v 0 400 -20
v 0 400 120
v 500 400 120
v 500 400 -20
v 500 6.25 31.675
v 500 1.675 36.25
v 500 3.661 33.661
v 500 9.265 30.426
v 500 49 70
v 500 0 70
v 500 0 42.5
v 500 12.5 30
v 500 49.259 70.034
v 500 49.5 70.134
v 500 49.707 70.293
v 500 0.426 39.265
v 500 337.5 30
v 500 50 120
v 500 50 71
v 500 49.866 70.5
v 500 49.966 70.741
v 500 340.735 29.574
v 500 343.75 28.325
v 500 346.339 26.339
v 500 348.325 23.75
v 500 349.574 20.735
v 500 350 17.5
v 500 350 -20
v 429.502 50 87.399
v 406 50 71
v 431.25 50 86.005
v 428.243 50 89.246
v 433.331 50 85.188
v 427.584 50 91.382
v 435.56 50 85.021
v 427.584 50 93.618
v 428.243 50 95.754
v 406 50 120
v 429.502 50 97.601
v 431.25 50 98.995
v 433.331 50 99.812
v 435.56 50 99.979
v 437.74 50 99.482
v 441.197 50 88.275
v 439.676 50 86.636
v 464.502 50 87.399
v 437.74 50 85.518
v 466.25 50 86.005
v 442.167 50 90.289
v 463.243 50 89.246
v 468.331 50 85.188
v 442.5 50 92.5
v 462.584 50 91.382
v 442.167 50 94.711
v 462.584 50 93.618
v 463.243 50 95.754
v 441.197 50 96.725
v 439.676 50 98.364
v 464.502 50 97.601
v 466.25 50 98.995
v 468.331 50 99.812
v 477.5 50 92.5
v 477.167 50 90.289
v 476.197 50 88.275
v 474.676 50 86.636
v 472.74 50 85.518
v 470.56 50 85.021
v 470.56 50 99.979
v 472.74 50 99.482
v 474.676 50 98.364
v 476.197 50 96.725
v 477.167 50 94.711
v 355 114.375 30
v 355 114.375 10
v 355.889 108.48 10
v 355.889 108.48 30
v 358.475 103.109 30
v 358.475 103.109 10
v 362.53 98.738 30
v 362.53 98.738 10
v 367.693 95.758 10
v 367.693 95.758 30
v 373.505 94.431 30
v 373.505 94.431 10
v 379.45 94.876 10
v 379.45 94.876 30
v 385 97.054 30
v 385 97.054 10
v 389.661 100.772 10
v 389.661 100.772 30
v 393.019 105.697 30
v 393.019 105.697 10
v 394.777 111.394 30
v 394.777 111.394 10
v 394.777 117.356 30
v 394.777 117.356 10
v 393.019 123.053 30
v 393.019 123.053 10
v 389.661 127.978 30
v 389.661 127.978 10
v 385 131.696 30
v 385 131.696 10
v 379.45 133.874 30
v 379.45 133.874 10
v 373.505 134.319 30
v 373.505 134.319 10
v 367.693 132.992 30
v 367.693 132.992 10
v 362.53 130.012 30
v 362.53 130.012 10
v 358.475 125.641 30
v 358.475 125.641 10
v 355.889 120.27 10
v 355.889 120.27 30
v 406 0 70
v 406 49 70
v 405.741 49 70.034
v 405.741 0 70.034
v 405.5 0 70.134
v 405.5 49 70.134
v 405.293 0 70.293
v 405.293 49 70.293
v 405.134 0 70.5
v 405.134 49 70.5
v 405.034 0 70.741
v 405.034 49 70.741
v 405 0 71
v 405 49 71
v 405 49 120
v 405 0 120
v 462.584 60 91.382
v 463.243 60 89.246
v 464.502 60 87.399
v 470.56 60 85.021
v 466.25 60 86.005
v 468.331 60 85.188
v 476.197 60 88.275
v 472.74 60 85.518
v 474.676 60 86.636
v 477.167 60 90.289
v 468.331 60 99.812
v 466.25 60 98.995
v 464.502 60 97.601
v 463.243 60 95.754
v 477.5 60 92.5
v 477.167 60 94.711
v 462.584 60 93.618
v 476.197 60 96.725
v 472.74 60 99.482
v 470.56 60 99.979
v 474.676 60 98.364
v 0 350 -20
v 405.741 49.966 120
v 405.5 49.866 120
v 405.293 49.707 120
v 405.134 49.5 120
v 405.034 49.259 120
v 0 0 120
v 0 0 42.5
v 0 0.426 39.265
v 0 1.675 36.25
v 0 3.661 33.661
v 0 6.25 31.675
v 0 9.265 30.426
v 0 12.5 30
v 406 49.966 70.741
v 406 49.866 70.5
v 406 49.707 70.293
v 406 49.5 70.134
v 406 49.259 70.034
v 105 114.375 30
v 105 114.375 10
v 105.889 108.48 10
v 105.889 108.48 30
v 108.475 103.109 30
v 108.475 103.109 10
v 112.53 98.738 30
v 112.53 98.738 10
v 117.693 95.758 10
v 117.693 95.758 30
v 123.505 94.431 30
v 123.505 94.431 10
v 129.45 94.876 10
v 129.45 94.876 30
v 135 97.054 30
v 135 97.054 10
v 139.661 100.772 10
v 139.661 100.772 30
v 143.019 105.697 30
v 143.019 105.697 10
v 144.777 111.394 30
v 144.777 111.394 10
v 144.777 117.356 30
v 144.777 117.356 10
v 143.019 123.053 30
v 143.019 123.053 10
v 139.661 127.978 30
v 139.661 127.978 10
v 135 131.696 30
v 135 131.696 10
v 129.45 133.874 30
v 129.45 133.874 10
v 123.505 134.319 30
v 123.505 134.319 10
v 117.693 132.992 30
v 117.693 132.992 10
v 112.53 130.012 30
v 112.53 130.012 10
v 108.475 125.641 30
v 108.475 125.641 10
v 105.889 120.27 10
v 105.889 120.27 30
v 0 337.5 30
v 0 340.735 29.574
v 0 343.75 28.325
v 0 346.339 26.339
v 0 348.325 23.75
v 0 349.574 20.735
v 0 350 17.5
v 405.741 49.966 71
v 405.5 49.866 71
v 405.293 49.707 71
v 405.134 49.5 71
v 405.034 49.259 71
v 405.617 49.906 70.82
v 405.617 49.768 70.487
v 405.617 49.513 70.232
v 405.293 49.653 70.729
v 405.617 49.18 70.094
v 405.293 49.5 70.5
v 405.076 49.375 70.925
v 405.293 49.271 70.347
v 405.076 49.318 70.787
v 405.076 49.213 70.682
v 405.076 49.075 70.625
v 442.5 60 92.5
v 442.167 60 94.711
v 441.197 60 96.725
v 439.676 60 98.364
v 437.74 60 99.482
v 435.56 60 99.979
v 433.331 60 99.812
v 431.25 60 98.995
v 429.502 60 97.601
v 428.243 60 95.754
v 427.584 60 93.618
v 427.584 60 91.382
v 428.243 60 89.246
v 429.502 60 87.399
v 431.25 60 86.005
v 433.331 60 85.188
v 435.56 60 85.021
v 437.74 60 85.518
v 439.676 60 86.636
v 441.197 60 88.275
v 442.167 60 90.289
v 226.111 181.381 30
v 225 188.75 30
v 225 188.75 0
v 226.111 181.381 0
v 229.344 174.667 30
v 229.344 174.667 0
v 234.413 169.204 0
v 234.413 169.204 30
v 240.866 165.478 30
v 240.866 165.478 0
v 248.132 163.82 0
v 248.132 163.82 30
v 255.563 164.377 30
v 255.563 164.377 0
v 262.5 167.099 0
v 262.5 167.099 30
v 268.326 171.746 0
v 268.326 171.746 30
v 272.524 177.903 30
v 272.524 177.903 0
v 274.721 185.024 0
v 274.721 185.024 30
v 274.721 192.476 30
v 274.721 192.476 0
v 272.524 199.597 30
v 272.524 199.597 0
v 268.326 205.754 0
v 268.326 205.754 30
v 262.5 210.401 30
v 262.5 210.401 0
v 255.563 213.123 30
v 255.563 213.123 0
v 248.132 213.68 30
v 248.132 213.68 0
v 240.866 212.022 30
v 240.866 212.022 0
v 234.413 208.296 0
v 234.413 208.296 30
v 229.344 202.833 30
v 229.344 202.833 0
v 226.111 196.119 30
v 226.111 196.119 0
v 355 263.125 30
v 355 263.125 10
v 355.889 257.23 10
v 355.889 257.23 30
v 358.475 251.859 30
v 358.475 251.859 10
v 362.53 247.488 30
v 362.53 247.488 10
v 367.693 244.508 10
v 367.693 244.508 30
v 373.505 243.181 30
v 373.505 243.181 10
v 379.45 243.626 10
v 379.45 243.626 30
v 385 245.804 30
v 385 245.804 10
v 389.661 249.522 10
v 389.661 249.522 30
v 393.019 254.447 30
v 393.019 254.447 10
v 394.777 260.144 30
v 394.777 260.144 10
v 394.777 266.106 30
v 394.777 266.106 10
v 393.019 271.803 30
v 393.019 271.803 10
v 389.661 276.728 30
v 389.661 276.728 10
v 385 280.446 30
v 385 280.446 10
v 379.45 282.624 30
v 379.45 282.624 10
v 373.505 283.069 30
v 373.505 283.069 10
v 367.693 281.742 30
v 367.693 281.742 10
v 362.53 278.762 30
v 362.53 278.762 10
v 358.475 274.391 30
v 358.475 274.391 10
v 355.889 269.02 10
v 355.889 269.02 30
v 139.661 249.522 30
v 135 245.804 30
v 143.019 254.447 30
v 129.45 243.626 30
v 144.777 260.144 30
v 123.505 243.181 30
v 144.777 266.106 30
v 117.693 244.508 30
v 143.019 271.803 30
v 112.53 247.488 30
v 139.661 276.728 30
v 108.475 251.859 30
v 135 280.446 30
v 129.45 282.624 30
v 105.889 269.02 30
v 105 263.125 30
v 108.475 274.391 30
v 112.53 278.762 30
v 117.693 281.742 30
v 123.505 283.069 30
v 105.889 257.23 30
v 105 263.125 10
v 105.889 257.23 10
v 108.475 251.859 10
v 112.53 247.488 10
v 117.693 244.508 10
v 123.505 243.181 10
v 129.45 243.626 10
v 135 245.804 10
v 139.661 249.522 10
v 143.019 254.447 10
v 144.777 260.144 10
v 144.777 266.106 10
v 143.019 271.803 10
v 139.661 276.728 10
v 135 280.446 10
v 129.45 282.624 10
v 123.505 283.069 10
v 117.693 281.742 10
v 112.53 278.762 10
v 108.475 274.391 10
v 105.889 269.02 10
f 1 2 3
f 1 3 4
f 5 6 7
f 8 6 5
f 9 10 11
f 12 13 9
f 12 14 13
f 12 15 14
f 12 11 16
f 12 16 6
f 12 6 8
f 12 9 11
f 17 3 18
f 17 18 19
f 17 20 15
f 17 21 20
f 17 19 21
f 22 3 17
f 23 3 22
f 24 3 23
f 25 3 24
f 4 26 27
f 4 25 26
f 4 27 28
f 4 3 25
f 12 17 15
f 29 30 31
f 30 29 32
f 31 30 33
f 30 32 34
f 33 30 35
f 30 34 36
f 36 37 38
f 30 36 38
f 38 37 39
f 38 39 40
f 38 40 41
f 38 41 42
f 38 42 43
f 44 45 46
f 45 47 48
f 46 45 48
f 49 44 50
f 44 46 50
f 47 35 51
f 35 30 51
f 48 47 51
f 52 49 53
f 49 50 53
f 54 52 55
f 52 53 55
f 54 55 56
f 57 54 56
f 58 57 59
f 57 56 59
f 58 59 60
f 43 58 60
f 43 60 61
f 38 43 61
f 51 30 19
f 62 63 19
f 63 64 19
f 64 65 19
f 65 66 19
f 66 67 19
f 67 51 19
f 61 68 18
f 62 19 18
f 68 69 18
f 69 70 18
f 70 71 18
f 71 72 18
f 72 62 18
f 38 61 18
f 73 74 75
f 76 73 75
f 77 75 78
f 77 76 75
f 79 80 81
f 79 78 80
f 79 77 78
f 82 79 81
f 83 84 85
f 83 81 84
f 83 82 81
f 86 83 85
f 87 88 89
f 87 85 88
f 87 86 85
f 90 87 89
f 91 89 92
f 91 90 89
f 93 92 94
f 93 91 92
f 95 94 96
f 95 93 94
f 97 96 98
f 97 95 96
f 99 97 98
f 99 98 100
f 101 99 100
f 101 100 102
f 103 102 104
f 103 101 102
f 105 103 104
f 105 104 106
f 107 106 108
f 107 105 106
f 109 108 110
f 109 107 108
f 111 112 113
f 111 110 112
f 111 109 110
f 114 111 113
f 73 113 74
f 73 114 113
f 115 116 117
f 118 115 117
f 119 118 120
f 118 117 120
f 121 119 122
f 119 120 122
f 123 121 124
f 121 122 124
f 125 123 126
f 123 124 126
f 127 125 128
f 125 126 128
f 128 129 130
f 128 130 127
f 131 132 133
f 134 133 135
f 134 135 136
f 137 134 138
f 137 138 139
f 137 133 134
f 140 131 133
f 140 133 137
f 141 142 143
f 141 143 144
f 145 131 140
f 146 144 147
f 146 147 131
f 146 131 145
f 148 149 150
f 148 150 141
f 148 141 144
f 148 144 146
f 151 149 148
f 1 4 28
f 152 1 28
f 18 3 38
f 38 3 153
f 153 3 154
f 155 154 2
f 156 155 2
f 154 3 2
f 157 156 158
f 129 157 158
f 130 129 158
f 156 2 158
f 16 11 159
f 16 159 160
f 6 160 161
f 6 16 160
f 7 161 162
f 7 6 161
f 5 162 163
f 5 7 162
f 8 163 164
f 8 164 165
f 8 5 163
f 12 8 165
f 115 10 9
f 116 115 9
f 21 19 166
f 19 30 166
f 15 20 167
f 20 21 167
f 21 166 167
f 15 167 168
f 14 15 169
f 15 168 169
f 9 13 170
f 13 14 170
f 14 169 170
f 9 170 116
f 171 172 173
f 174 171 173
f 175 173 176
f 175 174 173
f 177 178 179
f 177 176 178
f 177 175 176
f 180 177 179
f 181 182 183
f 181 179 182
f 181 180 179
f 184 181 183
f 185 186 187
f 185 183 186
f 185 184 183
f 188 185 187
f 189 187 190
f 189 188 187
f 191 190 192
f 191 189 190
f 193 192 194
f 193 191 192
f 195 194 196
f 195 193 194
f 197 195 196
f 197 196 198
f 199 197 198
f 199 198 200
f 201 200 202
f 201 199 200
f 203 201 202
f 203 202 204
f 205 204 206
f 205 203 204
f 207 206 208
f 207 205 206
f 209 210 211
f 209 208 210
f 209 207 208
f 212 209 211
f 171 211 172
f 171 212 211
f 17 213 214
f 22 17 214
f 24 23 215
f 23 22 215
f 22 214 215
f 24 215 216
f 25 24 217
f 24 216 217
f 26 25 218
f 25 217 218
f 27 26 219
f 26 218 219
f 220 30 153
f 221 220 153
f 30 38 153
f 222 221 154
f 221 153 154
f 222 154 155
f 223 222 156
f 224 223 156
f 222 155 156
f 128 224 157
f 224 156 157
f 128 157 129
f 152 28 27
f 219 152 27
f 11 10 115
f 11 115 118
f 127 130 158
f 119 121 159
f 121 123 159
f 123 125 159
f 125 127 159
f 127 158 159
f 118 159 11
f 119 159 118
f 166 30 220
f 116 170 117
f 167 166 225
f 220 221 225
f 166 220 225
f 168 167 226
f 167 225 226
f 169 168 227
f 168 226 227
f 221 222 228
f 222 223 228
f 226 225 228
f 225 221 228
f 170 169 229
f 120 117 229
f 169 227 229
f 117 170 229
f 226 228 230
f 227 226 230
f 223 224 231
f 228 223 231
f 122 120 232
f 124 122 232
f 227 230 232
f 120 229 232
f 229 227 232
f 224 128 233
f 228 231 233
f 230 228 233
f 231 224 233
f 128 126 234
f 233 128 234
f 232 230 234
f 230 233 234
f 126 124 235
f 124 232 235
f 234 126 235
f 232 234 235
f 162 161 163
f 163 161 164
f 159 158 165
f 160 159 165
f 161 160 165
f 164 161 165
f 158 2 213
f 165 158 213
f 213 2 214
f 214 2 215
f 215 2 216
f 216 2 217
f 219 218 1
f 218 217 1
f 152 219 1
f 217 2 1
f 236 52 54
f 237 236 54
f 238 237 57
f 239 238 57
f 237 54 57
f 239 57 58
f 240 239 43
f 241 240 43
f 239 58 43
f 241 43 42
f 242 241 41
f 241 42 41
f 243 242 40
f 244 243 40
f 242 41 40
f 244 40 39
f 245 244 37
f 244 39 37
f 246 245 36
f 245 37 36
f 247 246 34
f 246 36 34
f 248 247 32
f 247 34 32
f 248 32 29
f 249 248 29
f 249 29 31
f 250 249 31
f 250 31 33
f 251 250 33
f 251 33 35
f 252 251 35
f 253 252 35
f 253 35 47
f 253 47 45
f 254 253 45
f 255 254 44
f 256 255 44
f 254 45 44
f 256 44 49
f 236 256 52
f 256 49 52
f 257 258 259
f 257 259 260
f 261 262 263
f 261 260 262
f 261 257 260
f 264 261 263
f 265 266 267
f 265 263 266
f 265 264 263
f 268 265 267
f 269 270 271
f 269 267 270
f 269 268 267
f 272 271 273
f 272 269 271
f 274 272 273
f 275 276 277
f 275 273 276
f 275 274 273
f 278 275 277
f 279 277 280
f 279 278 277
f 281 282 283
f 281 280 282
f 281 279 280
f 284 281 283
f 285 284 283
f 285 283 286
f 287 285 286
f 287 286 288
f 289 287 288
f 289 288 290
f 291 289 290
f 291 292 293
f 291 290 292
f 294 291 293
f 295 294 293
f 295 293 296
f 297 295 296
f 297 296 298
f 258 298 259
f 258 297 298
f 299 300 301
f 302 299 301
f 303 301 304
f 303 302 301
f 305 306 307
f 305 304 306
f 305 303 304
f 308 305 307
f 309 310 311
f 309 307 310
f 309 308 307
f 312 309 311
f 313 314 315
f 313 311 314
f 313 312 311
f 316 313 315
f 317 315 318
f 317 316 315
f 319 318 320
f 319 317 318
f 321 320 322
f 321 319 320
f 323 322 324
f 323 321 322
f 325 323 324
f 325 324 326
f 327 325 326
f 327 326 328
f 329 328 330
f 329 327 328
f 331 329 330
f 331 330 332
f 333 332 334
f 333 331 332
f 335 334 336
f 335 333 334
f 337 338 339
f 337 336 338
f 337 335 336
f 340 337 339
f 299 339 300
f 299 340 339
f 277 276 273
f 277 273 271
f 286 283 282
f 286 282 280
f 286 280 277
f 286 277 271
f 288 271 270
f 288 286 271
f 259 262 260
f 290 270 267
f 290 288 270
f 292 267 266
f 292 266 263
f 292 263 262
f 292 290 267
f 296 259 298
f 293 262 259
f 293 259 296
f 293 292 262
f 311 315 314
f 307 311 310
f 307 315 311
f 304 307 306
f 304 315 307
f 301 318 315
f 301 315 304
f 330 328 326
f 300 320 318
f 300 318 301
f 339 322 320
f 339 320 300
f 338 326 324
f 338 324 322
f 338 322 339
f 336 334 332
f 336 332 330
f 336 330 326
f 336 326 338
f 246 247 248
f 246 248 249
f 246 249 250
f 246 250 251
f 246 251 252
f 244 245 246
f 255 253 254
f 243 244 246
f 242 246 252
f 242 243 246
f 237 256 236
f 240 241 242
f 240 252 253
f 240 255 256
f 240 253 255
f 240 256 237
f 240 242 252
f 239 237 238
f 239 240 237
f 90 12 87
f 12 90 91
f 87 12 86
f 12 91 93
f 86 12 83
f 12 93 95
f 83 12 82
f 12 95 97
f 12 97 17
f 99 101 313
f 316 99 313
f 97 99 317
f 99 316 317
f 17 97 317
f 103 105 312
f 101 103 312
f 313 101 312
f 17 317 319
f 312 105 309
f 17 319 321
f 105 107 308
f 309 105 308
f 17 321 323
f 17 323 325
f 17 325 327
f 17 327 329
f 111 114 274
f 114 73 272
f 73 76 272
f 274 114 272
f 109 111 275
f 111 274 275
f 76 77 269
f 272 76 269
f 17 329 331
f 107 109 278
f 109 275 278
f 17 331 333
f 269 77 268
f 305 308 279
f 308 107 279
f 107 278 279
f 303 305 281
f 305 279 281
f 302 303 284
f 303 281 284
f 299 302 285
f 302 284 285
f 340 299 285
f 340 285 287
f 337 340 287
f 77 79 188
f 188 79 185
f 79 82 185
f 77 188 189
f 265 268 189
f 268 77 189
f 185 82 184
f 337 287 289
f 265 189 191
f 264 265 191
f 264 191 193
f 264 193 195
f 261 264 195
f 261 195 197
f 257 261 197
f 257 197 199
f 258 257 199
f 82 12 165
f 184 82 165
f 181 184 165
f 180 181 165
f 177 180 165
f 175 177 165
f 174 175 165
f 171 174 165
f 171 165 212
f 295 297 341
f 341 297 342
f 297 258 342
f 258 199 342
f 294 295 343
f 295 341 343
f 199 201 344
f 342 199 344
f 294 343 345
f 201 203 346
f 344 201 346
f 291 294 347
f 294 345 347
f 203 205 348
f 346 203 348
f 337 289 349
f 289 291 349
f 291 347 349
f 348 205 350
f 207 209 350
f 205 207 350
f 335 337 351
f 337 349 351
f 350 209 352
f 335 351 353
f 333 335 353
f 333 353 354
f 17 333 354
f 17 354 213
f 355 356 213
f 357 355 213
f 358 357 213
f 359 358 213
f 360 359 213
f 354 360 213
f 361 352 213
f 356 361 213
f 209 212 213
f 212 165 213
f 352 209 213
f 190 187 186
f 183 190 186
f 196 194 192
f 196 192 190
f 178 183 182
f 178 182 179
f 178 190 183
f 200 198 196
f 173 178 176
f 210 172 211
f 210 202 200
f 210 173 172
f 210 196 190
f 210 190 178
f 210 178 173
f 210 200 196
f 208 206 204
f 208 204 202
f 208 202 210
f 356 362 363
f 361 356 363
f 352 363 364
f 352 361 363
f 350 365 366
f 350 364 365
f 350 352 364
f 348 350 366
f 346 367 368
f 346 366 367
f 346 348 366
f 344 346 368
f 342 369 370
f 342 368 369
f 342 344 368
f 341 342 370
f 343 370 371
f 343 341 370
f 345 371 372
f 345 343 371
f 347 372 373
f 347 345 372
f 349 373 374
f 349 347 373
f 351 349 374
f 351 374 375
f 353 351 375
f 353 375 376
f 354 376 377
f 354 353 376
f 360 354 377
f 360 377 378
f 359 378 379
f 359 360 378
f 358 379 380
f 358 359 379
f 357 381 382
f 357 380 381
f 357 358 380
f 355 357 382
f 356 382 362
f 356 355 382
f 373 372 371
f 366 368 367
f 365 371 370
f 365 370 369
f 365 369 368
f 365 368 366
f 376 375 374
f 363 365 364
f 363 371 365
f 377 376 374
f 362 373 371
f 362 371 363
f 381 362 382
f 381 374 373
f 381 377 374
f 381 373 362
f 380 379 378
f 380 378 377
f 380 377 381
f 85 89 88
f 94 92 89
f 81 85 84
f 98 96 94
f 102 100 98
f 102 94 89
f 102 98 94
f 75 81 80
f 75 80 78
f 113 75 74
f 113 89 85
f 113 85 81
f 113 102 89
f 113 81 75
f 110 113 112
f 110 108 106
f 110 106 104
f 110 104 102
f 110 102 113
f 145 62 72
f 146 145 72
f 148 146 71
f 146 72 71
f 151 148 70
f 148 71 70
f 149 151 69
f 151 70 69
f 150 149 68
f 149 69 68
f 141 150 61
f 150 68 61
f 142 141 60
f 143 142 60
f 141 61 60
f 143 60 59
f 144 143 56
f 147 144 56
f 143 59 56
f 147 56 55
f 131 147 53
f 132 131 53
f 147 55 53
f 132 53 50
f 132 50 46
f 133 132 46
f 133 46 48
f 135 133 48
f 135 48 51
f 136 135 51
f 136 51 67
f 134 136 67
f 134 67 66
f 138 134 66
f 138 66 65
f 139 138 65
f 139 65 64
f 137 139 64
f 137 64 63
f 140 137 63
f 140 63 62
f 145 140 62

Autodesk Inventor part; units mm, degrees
ref_plane "YZ Plane" through (0, 0, 0) normal (1, 0, 0) x (0, 1, 0)
ref_plane "XZ Plane" through (0, 0, 0) normal (0, 1, 0) x (-1, 0, 0)
ref_plane "XY Plane" through (0, 0, 0) normal (0, 0, 1) x (1, 0, 0)
sketch "Sketch1" plane through (0, 0, 0) normal (1, 0, 0) x (0, 1, 0)
  line L0 (400, 120) -> (0, 120)
  line L1 (0, 40) -> (0, 62.8571)
  line L2 (400, 120) -> (0, 120)
  line L3 (0, 120) -> (0, 30)
  line L4 (0, 30) -> (400, 30)
  line L5 (400, 30) -> (400, 120)
  dimension "d54" = 400
  dimension "d55" = 90
extrude "Extrusion1" add sketch "Sketch1" along normal blind 500
sketch "Sketch2" plane through (500, 0, 0) normal (1, 0, 0) x (0, 0, -1)
  line L0 (-30, 400) -> (20, 400)
  line L1 (20, 400) -> (20, 350)
  line L2 (20, 350) -> (-30, 350)
  line L3 (-30, 350) -> (-30, 400)
  arc A0 (-42.5, 0) -> (-30, 12.5) centre (-42.5, 12.5) ccw
  line L4 (-120, 0) -> (-30, 0) projected
  line L5 (-30, 0) -> (-64.3382, 0)
  line L6 (-30, 12.5) -> (-30, 0)
  line L7 (-120, 400) -> (-120, 0) projected
  line L8 (-120, 0) -> (-70, 0)
  line L9 (-70, 0) -> (-70, 50)
  line L10 (-70, 50) -> (-120, 50)
  line L11 (-120, 50) -> (-120, 0)
  point P0 (-70, 0)
  dimension "d11" = 50
  dimension "d12" = 50
  dimension "d33" = 12.5
  dimension "d38" = 50
  dimension "d39" = 50
extrude "Extrusion10" cut sketch "Sketch2" against normal blind 95 contours L4 L7 L10 L9
extrude "Extrusion11" cut sketch "Sketch2" against normal blind 500 contours A0 L6 L4
extrude "Extrusion12" add sketch "Sketch2" against normal blind 500 contours L0 L1 L2 L3
sketch "Sketch5" plane through (500, 50, 70) normal (0, -1, 0) x (1, 0, 0)
  line L0 (0, 0) -> (-95, 0) projected
  line L1 (0, 0) -> (-90, 0)
  line L2 (-90, 0) -> (-90, 45)
  line L3 (-90, 45) -> (0, 45)
  line L4 (0, 45) -> (0, 0)
  line L5 (0, 22.5) -> (-30, 22.5)
  circle A0 centre (-30, 22.5) radius 7.5
  line L6 (-30, 22.5) -> (-65, 22.5)
  circle A1 centre (-65, 22.5) radius 7.5
  point P0 (-500, -70)
  dimension "d46" = 90
  dimension "d47" = 45
  dimension "d48" = 30
  dimension "d49" = 15
  dimension "d50" = 35
  dimension "d51" = 15
extrude "Extrusion13" cut sketch "Sketch5" against normal blind 10 contours A1 | A0 L6 L5 | L5 L6 A0
fillet "Fillet3" radius 12.5 1 edges at (250, 350, 30)
sketch "Sketch6" plane through (500, 12.5, 30) normal (0, 0, -1) x (-1, 0, 0)
  line L0 (500, 325) -> (500, 337.5) projected
  circle A0 centre (250, 176.25) radius 25
  circle A1 centre (125, 250.625) radius 20
  circle A2 centre (375, 250.625) radius 20
  circle A3 centre (375, 101.875) radius 20
  circle A4 centre (125, 101.875) radius 20
  dimension "d57" = 50
  dimension "d58" = 40
  dimension "d59" = 40
  dimension "d60" = 40
  dimension "d61" = 40
extrude "Extrusion14" add sketch "Sketch6" along normal blind 30 contours A0
extrude "Extrusion15" add sketch "Sketch6" along normal blind 20 contours A1 | A2 | A3 | A4
fillet "Fillet4" radius 1 1 edges at (452.5, 50, 70)
fillet "Fillet5" radius 1 3 edges at (405, 49.7071, 70.2929) (405, 24.5, 70) (405, 50, 95.5)
properties part number "Molde" material "Aluminum 6061"
